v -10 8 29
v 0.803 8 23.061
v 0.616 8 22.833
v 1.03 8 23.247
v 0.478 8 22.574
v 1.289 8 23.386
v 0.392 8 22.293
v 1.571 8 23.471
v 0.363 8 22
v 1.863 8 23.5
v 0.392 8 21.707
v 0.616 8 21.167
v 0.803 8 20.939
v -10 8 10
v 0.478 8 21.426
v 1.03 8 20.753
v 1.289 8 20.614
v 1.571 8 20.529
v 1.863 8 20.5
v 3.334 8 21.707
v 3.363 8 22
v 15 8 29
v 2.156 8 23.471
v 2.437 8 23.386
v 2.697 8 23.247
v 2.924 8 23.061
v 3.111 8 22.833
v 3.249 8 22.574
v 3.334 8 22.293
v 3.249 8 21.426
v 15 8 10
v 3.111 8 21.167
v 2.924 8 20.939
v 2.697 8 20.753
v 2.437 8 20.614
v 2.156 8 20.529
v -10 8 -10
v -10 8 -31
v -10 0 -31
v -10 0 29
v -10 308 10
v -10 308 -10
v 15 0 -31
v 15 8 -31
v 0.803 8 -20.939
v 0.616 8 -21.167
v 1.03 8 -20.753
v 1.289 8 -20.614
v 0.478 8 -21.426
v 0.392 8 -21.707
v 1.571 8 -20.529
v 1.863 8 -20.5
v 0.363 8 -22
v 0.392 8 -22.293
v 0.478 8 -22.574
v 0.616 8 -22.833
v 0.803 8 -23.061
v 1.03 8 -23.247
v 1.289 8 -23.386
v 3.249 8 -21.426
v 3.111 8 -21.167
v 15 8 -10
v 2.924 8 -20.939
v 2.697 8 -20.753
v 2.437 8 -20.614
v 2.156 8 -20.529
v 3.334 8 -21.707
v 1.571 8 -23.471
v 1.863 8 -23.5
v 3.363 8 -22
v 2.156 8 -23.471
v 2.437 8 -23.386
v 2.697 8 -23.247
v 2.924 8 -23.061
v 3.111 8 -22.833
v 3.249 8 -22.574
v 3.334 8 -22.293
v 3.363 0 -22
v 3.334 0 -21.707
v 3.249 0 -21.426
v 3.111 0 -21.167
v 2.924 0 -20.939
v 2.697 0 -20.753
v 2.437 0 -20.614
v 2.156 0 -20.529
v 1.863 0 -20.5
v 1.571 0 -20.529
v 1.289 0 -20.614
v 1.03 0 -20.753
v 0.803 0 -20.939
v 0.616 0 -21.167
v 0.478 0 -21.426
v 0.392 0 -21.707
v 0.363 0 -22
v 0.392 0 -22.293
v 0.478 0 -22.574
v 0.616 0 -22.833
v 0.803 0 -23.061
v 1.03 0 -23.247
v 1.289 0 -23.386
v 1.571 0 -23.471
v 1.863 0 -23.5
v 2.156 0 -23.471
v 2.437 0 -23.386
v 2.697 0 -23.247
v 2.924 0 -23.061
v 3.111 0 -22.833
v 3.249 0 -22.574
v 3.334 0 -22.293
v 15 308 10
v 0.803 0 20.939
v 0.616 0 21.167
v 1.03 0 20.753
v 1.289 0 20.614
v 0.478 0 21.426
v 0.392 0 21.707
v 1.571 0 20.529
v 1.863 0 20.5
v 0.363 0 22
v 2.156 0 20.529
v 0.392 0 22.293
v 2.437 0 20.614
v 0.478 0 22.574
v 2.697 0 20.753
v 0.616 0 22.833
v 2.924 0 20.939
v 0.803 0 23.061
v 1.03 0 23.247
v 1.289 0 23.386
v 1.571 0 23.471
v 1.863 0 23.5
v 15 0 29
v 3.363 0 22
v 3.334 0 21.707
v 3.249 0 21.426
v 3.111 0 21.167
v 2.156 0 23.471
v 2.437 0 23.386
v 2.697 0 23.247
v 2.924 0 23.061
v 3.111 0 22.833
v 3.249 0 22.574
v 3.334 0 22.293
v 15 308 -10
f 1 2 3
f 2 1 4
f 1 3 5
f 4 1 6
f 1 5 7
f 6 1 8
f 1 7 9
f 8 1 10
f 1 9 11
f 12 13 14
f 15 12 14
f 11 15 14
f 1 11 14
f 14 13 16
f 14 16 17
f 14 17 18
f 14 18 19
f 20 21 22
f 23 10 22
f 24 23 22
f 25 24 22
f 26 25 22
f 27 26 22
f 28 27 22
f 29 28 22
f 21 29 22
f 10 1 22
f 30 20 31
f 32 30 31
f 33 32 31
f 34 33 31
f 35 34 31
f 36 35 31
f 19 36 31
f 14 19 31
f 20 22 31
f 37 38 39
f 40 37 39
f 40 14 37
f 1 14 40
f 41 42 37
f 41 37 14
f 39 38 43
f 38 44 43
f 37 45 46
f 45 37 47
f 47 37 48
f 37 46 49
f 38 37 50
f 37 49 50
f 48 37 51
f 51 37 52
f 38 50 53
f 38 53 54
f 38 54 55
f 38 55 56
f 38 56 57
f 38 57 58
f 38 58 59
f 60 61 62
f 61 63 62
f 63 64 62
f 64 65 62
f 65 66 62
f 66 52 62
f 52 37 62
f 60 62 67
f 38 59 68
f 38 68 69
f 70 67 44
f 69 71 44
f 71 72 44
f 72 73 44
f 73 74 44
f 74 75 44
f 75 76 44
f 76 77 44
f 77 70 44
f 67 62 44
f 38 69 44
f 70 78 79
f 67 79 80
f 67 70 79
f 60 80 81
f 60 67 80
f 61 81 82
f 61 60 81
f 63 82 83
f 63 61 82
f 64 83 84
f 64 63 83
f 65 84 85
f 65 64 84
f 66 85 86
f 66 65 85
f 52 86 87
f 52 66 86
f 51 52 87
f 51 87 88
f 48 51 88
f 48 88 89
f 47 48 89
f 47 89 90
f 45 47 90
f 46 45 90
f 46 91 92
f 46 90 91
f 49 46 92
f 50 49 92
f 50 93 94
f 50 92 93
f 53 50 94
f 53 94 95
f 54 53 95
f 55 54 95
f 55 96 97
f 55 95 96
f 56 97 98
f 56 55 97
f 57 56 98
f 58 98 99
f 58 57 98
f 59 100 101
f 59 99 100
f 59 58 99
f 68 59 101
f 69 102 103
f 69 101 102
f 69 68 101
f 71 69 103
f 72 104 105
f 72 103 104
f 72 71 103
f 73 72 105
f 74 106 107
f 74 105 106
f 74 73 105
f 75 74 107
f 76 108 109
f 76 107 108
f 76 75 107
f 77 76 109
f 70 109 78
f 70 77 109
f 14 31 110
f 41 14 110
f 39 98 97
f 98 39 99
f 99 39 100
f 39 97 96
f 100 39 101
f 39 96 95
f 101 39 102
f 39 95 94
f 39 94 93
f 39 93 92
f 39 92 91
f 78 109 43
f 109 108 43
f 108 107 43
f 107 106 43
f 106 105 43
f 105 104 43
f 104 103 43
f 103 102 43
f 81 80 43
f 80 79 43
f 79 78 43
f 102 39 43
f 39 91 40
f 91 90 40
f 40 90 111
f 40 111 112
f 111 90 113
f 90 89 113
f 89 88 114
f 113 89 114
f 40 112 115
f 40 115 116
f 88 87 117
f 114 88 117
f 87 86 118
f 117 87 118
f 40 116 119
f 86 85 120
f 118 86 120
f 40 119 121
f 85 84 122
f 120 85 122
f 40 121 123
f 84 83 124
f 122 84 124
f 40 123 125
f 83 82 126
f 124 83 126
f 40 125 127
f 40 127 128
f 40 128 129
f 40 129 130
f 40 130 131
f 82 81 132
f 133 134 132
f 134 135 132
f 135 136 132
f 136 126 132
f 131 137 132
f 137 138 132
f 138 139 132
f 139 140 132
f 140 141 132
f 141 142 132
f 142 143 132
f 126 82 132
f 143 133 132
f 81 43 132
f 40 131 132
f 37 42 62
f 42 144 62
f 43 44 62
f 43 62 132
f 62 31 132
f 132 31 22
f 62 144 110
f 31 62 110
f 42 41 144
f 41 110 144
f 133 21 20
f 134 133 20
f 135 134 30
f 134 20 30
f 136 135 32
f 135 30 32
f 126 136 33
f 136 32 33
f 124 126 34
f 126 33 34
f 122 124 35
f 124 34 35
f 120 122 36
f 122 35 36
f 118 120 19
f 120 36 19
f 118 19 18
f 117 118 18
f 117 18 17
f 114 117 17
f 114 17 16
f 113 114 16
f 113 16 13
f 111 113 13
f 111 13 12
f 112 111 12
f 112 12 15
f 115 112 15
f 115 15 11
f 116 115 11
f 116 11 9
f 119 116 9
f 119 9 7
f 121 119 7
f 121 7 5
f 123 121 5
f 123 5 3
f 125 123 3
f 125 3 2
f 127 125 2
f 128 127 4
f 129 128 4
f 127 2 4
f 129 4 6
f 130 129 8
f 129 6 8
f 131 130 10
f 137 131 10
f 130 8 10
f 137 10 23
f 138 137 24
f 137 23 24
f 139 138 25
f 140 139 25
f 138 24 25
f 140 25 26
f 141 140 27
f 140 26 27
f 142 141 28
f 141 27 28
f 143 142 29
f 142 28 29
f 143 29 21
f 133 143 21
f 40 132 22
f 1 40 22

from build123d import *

# Parameters (mm, degrees)
BOSS_EXTRUDE1_DEPTH      = 15
BOSS_EXTRUDE1_DEPTH_BACK = 10
SKETCH3_R                = 1.5
CUT_EXTRUDE2_DEPTH       = 9


with BuildPart() as part:
    # Sketch2 → Boss-Extrude1 (new body, two sides)
    with BuildSketch(Plane(origin=(0, 0, 0), x_dir=(0, 0, -1), z_dir=(1, 0, 0))) as boss_extrude1_sk:
        Polygon((-10, 8), (-10, 308), (10, 308), (10, 8), (31, 8), (31, 0), (-29, 0), (-29, 8), align=None)
    extrude(amount=BOSS_EXTRUDE1_DEPTH)
    extrude(boss_extrude1_sk.sketch, amount=-BOSS_EXTRUDE1_DEPTH_BACK)

    # Sketch3 → Cut-Extrude2 (cut, through all)
    with BuildSketch(Plane(origin=(0, 8, 0), x_dir=(1, 0, 0), z_dir=(0, 1, 0))):
        with Locations((1.863320083, -22)):
            Circle(SKETCH3_R)
    cut_extrude2 = extrude(amount=-CUT_EXTRUDE2_DEPTH, mode=Mode.SUBTRACT)

    # Mirror2: Cut-Extrude2 across plane
    add(cut_extrude2.mirror(Plane.XY), mode=Mode.SUBTRACT)


solid = part.part
